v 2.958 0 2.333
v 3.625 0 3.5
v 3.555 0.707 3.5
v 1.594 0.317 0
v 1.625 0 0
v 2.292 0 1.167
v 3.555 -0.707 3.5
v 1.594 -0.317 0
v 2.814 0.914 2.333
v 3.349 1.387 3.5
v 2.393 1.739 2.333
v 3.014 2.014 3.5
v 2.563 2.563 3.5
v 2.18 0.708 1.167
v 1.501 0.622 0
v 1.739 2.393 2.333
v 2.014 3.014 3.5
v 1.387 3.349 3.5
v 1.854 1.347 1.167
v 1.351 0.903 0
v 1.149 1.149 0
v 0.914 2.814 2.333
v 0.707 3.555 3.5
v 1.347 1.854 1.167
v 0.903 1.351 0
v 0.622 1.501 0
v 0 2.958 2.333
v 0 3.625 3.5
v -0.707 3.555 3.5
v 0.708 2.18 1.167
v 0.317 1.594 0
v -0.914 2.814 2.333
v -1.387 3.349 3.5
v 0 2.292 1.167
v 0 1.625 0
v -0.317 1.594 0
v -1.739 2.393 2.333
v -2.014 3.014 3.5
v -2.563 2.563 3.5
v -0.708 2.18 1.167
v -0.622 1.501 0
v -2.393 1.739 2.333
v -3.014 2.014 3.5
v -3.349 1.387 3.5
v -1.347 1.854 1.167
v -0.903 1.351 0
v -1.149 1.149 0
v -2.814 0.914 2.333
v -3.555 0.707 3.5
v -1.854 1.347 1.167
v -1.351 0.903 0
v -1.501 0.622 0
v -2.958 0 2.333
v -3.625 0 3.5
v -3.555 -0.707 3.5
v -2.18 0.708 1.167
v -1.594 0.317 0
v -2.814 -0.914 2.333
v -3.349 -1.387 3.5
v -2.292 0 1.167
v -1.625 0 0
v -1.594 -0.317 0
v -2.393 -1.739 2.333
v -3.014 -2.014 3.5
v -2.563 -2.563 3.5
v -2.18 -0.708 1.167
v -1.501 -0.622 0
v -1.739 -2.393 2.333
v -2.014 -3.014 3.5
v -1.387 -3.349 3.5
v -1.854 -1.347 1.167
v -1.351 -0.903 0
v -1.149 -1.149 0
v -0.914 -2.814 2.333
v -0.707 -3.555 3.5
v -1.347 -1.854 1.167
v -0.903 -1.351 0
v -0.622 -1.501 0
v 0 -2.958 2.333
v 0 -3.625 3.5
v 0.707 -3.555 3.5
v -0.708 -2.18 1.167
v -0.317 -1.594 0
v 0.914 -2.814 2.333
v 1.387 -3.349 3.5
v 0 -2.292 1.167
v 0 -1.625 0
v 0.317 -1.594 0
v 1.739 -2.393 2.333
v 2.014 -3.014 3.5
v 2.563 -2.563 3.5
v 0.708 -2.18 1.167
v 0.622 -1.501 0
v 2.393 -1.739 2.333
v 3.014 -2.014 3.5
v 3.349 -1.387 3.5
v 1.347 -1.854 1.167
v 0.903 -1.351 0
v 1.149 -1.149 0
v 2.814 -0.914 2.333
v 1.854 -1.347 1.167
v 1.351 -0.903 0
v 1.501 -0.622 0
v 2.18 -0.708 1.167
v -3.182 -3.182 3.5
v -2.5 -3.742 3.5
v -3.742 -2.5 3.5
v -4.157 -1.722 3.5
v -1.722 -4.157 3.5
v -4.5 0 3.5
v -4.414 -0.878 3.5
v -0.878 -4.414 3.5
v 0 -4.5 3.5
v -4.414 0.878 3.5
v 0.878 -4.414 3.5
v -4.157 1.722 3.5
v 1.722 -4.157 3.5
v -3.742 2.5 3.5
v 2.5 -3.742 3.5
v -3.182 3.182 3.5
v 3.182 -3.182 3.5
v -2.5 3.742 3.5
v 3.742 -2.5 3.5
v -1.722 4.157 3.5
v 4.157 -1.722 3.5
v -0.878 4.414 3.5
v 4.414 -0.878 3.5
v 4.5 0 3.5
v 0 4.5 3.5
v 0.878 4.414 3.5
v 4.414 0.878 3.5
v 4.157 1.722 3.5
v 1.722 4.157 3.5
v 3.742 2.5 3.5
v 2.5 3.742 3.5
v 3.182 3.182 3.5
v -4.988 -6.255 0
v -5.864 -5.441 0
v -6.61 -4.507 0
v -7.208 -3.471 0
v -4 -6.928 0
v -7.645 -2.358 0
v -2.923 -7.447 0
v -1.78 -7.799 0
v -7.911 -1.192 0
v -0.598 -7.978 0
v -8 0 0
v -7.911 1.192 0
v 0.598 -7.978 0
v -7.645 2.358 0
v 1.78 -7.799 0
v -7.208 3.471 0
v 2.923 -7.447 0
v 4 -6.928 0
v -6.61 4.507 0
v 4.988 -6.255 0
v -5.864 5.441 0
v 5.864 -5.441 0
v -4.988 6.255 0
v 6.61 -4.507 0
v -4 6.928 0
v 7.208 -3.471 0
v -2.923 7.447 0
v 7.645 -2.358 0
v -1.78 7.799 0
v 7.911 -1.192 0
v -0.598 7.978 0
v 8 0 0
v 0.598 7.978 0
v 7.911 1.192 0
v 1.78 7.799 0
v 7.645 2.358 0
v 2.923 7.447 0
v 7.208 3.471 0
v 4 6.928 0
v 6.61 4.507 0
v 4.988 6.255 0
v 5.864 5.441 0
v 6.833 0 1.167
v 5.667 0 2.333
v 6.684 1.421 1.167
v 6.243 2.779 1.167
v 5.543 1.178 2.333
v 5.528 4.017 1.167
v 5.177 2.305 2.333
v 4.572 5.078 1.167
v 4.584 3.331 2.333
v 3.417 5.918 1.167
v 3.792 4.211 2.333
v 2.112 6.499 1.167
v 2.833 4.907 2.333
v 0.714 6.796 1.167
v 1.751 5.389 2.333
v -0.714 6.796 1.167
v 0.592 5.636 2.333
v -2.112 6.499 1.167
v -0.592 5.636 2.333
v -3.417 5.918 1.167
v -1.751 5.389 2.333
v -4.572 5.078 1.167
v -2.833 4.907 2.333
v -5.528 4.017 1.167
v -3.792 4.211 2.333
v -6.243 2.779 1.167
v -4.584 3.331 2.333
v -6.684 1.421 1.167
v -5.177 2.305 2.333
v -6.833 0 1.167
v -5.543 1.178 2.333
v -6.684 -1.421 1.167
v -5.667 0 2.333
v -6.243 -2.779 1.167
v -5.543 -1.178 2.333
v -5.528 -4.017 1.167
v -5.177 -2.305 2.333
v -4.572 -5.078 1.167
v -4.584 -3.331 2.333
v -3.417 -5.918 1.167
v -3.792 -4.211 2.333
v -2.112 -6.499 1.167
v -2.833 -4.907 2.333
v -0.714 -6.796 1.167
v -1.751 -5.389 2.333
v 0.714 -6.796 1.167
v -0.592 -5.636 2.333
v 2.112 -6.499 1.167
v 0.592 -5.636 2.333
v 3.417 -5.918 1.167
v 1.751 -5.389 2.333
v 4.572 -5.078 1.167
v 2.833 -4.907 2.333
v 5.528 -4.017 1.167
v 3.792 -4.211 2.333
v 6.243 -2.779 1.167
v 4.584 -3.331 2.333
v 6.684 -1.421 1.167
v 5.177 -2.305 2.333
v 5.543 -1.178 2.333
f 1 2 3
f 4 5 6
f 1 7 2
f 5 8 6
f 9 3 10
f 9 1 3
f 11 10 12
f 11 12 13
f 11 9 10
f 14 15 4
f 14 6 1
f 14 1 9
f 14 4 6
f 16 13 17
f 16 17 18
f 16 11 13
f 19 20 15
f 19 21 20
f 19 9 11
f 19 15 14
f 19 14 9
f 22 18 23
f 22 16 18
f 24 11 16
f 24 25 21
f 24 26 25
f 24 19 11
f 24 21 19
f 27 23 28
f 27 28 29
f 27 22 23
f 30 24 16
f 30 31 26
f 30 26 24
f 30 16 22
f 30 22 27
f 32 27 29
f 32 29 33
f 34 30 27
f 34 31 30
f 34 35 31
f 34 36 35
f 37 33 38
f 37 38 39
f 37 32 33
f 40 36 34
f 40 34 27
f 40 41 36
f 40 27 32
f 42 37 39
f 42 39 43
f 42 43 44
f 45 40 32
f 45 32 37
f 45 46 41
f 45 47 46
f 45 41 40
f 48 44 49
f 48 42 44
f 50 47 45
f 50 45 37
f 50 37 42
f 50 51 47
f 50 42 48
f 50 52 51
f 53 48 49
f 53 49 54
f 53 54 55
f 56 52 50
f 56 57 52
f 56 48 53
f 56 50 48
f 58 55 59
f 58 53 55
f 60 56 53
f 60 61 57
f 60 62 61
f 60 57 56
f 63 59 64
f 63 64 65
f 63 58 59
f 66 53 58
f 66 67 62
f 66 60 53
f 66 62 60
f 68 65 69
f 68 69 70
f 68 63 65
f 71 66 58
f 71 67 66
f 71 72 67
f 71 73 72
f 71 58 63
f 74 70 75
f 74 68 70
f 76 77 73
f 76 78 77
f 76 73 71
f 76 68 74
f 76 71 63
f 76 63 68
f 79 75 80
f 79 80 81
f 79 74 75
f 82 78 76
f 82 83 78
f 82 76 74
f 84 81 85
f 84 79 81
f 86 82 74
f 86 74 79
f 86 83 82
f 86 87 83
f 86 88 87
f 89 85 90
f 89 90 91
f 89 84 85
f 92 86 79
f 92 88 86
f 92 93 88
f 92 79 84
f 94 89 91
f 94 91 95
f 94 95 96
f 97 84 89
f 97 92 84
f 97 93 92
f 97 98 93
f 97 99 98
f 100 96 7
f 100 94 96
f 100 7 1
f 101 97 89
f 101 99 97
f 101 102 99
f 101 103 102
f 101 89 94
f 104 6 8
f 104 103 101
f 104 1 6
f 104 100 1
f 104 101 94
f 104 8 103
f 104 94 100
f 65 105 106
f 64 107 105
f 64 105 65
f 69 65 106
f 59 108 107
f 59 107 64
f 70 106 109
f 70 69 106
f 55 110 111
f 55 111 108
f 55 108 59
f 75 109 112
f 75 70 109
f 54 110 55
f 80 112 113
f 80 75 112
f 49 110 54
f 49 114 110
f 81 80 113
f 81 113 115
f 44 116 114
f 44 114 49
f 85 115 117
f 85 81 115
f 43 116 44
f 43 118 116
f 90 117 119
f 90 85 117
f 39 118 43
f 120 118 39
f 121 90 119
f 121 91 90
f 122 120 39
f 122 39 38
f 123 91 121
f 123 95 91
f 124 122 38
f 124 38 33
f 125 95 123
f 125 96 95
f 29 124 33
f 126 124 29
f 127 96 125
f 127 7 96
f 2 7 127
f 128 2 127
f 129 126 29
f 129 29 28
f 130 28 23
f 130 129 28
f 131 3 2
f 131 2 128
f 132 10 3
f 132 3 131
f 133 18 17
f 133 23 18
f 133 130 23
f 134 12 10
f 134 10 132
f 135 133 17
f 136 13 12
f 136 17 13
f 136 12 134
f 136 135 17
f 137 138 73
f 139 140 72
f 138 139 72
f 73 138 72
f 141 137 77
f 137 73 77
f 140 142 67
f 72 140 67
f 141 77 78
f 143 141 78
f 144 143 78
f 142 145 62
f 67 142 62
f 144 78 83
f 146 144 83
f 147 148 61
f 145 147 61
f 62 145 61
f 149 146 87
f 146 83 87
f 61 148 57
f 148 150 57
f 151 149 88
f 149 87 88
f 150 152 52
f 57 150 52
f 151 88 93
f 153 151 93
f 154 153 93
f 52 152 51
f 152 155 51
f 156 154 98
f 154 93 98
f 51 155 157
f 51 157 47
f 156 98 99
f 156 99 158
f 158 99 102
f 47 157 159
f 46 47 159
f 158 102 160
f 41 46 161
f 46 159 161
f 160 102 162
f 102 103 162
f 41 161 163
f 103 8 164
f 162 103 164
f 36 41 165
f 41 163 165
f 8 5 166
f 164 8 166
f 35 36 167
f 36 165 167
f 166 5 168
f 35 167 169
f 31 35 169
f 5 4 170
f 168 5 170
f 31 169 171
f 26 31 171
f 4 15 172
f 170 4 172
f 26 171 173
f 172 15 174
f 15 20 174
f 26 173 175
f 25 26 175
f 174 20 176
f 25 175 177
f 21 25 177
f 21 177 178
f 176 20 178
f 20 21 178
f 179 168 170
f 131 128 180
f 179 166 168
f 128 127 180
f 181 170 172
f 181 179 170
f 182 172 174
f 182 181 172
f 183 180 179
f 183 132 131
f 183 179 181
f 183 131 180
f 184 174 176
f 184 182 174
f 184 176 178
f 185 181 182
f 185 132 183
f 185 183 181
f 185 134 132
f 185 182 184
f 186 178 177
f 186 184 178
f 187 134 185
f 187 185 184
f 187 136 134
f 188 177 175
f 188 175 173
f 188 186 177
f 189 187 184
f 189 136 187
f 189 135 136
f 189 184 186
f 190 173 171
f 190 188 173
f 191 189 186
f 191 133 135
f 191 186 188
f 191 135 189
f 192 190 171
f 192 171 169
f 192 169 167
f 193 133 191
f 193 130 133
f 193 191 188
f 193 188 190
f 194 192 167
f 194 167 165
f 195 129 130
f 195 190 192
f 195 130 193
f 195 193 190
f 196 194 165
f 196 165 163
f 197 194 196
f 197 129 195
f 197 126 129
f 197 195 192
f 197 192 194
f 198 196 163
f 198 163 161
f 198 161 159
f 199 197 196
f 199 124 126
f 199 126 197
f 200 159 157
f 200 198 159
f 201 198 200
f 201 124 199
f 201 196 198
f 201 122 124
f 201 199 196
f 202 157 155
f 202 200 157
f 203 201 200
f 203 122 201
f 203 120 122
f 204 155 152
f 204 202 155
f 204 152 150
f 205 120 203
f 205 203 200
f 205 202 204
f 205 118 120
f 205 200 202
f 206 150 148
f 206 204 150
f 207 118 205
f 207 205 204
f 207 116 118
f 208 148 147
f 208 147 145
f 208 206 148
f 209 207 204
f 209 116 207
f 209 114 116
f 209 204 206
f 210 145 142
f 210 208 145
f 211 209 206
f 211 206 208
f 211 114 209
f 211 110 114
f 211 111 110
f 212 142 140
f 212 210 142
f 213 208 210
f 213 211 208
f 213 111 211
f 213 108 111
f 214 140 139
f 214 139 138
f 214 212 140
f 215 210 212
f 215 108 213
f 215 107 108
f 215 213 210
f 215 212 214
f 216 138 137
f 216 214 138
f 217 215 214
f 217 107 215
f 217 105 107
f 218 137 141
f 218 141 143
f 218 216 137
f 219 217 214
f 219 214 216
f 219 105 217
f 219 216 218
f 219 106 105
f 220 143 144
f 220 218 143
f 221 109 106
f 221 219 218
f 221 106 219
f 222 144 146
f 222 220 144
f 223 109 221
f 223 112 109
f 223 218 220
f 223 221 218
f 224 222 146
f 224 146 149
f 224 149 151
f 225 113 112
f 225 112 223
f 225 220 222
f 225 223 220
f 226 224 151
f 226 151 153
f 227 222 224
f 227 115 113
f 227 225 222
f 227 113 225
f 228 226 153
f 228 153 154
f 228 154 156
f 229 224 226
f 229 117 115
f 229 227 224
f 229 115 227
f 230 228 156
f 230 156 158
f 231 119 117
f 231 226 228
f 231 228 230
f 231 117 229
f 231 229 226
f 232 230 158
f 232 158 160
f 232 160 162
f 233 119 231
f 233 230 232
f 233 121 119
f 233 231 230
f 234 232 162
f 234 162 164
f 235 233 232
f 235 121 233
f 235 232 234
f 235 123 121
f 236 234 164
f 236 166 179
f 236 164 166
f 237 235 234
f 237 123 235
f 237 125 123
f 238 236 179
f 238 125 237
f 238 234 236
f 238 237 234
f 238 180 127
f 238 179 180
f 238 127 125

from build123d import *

# Parameters (mm, degrees)
F0_R     = 8
F1_DEPTH = 3.5
F2_SIZE  = 3.49999
F3_R     = 3.625
F4_R     = 1.625


# Not quite as in the source:
# - a fillet or chamfer is up to 0.001 mm smaller than in the source, because OpenCascade refuses the exact size


with BuildPart() as f1:
    # F0 (on Top) → F1 (new body)
    with BuildSketch(Plane.XY):
        Circle(F0_R)
    extrude(amount=F1_DEPTH)

    # F2 (size 3.5 in the source; OpenCascade refuses exactly that, so slightly less here)
    f2_edges = [f1.edges().sort_by_distance(p)[0] for p in [
        (-8, 0, 3.5),
    ]]
    chamfer(f2_edges, length=F2_SIZE)

    # F3 (on face) → F5 section 0
    with BuildSketch(Plane.XY.offset(3.5)):
        Circle(F3_R)
    # F4 (on Top) → F5 section 1
    with BuildSketch(Plane.XY):
        Circle(F4_R)
    loft(mode=Mode.SUBTRACT)


solid = f1.part
